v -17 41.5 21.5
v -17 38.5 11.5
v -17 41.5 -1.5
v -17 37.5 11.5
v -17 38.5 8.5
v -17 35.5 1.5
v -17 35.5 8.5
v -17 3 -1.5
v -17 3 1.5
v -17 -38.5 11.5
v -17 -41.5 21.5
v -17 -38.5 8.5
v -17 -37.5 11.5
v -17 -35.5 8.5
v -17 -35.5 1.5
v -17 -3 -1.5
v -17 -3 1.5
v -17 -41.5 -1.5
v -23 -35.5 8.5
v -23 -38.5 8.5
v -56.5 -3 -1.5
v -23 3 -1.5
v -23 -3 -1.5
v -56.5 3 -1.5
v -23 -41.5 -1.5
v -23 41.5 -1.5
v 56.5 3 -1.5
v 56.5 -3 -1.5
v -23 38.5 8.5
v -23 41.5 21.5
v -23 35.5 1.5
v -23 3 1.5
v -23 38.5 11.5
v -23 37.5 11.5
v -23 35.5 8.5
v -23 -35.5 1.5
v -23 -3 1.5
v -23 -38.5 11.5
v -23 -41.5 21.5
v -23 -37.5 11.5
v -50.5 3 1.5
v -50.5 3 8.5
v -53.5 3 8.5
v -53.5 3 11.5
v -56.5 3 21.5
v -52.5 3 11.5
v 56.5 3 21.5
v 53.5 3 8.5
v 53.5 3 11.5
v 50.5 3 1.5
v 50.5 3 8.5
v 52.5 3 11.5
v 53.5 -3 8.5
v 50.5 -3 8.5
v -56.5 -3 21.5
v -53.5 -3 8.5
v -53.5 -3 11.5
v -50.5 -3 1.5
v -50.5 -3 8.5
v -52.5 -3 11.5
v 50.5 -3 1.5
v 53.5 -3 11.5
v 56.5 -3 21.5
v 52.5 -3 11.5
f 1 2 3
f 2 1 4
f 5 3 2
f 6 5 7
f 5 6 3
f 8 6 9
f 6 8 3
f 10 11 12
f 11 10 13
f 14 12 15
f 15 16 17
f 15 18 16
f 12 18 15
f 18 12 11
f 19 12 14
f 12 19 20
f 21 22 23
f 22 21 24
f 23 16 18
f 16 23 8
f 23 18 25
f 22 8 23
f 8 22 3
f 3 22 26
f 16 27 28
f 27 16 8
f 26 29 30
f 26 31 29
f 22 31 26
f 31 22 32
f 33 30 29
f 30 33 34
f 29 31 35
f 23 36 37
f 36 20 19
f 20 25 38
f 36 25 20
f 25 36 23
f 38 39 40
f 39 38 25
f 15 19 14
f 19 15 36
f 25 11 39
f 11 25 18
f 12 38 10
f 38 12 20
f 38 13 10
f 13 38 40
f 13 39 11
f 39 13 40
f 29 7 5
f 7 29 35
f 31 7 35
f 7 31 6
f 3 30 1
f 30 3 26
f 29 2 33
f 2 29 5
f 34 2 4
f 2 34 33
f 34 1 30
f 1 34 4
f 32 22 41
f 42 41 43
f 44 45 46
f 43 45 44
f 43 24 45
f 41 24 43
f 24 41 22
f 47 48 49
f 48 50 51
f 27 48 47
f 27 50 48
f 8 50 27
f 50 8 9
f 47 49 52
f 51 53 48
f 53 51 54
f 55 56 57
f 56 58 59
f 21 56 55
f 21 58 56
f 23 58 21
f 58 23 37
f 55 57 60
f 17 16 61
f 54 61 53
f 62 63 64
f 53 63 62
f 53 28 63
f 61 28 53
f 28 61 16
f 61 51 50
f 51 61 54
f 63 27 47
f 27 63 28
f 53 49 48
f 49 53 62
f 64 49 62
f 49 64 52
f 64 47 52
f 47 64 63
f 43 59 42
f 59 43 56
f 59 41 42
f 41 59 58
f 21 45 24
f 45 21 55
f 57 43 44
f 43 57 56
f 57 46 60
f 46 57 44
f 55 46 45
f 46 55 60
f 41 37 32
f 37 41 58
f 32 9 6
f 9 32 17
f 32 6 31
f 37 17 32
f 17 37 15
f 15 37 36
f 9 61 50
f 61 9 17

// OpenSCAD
snap_holder();
cube([107, 6, 3], center=true);
translate([-20,0,0])
cube([6, 77, 3], center=true);

module snap_holder(){
    translate([-23,-77/2-3,-1.5])
    snap_arm();
    translate([-17,+77/2+3,-1.5])
    rotate([0,0,180])
    snap_arm();
    
    translate([107/2+3,-3,-1.5])
    rotate([0,0,90])
    snap_arm();
    
    translate([-107/2-3,3,-1.5])
    rotate([0,0,-90])
    snap_arm();
}

module snap_arm(stand_height=10, lip_height=3){
    cube([6,6,stand_height]);
    cube([6,3,stand_height+lip_height+2]);
    translate([0,0,stand_height+lip_height])
    rotate([90,0,90])
    linear_extrude(6)
    polygon([[0,0], [0,10], [4,0]]);
}
